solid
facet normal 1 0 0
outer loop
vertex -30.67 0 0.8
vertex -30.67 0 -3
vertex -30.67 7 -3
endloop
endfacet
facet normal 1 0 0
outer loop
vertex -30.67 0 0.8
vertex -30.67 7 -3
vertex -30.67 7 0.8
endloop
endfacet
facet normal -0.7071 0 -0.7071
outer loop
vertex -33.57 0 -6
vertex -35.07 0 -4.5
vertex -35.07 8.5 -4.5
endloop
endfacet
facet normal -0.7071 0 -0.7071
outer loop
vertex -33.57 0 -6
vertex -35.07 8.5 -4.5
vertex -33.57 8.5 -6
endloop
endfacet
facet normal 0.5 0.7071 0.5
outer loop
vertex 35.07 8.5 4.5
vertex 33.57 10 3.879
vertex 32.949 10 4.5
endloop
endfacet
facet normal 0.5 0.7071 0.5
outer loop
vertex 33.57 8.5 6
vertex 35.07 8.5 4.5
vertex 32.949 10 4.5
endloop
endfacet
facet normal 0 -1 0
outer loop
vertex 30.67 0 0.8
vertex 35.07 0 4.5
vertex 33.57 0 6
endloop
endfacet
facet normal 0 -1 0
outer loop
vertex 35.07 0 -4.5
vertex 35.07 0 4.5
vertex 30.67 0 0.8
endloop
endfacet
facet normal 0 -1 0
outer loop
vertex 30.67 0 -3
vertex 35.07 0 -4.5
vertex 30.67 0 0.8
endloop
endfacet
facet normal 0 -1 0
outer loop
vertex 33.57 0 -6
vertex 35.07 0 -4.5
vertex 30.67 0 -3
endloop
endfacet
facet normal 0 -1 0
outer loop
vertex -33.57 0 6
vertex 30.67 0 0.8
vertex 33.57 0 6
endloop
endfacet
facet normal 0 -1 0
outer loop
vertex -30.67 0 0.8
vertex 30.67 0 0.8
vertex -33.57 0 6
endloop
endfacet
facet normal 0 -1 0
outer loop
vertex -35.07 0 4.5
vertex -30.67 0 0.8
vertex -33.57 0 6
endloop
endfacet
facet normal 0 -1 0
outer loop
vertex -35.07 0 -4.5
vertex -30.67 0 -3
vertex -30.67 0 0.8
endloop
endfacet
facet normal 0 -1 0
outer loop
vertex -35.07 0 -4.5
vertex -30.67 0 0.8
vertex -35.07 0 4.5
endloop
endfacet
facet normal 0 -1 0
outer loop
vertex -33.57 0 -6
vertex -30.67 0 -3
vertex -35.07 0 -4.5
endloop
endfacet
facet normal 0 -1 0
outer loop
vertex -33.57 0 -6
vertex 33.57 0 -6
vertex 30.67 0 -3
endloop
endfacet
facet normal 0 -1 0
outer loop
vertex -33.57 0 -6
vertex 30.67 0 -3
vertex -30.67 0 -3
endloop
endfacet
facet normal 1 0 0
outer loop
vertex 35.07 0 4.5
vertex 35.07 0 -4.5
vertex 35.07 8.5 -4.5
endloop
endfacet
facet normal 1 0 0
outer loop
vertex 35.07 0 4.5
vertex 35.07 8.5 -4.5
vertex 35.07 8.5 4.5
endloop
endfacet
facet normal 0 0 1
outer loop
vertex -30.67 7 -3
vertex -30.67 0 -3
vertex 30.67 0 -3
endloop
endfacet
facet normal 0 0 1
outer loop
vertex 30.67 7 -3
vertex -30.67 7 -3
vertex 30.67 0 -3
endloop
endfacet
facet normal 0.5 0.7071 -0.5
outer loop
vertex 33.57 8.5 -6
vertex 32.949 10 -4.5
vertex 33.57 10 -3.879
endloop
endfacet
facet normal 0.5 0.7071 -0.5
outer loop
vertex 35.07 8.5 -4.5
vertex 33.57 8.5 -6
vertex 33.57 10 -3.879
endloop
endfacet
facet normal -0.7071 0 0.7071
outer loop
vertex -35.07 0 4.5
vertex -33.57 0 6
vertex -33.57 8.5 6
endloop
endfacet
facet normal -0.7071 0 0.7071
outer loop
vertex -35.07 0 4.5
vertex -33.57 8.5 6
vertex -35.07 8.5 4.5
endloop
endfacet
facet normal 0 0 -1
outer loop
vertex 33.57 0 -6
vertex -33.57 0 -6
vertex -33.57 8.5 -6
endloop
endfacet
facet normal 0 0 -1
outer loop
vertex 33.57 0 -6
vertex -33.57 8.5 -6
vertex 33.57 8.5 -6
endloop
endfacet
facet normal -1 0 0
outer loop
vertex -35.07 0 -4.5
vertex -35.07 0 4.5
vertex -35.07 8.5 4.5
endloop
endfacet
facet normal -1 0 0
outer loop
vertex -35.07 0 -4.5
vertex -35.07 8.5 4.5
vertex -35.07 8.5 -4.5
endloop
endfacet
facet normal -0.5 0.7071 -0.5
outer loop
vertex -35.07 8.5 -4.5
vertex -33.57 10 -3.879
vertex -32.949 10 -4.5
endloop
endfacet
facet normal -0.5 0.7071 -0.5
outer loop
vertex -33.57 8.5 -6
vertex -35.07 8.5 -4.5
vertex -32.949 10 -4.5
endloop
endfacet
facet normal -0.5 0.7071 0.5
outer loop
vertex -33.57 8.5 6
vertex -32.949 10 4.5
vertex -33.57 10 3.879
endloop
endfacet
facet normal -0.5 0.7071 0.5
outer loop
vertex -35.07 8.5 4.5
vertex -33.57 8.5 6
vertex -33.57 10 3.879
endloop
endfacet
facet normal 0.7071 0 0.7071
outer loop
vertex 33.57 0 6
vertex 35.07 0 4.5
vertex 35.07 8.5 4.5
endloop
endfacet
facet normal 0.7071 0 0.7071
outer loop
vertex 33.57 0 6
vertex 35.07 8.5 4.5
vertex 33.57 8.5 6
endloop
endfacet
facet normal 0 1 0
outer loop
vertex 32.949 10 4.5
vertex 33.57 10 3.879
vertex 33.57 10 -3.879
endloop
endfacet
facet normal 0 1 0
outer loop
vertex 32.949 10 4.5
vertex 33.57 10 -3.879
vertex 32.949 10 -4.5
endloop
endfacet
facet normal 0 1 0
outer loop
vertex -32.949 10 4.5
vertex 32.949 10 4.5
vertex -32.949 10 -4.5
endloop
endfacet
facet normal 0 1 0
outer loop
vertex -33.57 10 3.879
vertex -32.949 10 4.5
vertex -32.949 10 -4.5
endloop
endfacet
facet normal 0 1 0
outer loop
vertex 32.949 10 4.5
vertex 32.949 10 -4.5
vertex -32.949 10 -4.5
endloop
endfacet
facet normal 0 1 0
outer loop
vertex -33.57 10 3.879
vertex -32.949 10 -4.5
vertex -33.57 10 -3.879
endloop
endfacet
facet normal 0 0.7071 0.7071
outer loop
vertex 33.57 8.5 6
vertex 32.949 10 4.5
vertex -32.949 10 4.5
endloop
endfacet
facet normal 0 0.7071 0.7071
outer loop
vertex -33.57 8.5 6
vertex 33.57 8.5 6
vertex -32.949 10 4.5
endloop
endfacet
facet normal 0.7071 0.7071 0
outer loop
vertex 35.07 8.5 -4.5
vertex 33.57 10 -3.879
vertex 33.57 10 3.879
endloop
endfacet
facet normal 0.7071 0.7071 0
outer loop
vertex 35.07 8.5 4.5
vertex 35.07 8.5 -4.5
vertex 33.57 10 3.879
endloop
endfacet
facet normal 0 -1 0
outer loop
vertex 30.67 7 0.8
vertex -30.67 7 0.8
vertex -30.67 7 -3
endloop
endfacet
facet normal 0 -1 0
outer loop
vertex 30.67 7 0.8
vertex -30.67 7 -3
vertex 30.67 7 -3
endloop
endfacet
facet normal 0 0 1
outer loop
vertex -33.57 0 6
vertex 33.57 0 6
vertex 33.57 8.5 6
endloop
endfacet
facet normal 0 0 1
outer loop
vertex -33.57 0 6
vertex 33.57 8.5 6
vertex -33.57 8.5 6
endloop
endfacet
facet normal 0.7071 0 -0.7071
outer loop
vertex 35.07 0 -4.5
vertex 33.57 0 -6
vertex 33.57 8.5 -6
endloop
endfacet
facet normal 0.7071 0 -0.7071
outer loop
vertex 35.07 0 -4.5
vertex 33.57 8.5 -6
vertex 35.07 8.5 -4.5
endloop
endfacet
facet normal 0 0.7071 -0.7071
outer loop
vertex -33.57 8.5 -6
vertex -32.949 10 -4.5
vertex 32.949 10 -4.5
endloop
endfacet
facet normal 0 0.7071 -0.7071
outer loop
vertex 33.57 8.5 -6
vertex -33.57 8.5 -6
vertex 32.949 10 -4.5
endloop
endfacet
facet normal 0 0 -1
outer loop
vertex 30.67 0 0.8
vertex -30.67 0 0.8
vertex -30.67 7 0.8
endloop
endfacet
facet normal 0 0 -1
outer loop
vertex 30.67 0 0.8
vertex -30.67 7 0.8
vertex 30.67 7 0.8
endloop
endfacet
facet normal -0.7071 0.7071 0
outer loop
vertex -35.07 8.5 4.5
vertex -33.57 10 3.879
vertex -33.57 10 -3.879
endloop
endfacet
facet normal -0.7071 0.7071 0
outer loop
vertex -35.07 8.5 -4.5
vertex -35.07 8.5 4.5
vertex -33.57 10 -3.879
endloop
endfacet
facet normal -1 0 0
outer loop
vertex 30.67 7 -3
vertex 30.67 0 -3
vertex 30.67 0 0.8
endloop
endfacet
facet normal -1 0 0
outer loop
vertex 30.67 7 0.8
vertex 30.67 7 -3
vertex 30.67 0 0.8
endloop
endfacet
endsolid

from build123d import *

# Parameters (mm, degrees)
BOSS_EXTRUDE1_DEPTH = 10
CHAMFER1_SIZE       = 1.5
SKETCH2_W           = 61.34
SKETCH2_H           = 3.8
CUT_EXTRUDE1_DEPTH  = 7


with BuildPart() as part:
    # Sketch1 → Boss-Extrude1 (new body)
    with BuildSketch(Plane(origin=(0, 0, 0), x_dir=(1, 0, 0), z_dir=(0, 1, 0))):
        Polygon((-35.07, 4.5), (-33.57, 6), (33.57, 6), (35.07, 4.5), (35.07, -4.5), (33.57, -6), (-33.57, -6), (-35.07, -4.5), align=None)
    extrude(amount=BOSS_EXTRUDE1_DEPTH)

    # Chamfer1
    chamfer1_edges = [part.edges().sort_by_distance(p)[0] for p in [
        (0, 10, 6),
        (34.32, 10, 5.25),
        (35.07, 10, 0),
        (34.32, 10, -5.25),
        (0, 10, -6),
        (-34.32, 10, -5.25),
        (-35.07, 10, 0),
        (-34.32, 10, 5.25),
    ]]
    chamfer(chamfer1_edges, length=CHAMFER1_SIZE)

    # Sketch2 → Cut-Extrude1 (cut)
    with BuildSketch(Plane.XZ):
        with Locations((0, -1.1)):
            Rectangle(SKETCH2_W, SKETCH2_H)
    extrude(amount=-CUT_EXTRUDE1_DEPTH, mode=Mode.SUBTRACT)


solid = part.part
